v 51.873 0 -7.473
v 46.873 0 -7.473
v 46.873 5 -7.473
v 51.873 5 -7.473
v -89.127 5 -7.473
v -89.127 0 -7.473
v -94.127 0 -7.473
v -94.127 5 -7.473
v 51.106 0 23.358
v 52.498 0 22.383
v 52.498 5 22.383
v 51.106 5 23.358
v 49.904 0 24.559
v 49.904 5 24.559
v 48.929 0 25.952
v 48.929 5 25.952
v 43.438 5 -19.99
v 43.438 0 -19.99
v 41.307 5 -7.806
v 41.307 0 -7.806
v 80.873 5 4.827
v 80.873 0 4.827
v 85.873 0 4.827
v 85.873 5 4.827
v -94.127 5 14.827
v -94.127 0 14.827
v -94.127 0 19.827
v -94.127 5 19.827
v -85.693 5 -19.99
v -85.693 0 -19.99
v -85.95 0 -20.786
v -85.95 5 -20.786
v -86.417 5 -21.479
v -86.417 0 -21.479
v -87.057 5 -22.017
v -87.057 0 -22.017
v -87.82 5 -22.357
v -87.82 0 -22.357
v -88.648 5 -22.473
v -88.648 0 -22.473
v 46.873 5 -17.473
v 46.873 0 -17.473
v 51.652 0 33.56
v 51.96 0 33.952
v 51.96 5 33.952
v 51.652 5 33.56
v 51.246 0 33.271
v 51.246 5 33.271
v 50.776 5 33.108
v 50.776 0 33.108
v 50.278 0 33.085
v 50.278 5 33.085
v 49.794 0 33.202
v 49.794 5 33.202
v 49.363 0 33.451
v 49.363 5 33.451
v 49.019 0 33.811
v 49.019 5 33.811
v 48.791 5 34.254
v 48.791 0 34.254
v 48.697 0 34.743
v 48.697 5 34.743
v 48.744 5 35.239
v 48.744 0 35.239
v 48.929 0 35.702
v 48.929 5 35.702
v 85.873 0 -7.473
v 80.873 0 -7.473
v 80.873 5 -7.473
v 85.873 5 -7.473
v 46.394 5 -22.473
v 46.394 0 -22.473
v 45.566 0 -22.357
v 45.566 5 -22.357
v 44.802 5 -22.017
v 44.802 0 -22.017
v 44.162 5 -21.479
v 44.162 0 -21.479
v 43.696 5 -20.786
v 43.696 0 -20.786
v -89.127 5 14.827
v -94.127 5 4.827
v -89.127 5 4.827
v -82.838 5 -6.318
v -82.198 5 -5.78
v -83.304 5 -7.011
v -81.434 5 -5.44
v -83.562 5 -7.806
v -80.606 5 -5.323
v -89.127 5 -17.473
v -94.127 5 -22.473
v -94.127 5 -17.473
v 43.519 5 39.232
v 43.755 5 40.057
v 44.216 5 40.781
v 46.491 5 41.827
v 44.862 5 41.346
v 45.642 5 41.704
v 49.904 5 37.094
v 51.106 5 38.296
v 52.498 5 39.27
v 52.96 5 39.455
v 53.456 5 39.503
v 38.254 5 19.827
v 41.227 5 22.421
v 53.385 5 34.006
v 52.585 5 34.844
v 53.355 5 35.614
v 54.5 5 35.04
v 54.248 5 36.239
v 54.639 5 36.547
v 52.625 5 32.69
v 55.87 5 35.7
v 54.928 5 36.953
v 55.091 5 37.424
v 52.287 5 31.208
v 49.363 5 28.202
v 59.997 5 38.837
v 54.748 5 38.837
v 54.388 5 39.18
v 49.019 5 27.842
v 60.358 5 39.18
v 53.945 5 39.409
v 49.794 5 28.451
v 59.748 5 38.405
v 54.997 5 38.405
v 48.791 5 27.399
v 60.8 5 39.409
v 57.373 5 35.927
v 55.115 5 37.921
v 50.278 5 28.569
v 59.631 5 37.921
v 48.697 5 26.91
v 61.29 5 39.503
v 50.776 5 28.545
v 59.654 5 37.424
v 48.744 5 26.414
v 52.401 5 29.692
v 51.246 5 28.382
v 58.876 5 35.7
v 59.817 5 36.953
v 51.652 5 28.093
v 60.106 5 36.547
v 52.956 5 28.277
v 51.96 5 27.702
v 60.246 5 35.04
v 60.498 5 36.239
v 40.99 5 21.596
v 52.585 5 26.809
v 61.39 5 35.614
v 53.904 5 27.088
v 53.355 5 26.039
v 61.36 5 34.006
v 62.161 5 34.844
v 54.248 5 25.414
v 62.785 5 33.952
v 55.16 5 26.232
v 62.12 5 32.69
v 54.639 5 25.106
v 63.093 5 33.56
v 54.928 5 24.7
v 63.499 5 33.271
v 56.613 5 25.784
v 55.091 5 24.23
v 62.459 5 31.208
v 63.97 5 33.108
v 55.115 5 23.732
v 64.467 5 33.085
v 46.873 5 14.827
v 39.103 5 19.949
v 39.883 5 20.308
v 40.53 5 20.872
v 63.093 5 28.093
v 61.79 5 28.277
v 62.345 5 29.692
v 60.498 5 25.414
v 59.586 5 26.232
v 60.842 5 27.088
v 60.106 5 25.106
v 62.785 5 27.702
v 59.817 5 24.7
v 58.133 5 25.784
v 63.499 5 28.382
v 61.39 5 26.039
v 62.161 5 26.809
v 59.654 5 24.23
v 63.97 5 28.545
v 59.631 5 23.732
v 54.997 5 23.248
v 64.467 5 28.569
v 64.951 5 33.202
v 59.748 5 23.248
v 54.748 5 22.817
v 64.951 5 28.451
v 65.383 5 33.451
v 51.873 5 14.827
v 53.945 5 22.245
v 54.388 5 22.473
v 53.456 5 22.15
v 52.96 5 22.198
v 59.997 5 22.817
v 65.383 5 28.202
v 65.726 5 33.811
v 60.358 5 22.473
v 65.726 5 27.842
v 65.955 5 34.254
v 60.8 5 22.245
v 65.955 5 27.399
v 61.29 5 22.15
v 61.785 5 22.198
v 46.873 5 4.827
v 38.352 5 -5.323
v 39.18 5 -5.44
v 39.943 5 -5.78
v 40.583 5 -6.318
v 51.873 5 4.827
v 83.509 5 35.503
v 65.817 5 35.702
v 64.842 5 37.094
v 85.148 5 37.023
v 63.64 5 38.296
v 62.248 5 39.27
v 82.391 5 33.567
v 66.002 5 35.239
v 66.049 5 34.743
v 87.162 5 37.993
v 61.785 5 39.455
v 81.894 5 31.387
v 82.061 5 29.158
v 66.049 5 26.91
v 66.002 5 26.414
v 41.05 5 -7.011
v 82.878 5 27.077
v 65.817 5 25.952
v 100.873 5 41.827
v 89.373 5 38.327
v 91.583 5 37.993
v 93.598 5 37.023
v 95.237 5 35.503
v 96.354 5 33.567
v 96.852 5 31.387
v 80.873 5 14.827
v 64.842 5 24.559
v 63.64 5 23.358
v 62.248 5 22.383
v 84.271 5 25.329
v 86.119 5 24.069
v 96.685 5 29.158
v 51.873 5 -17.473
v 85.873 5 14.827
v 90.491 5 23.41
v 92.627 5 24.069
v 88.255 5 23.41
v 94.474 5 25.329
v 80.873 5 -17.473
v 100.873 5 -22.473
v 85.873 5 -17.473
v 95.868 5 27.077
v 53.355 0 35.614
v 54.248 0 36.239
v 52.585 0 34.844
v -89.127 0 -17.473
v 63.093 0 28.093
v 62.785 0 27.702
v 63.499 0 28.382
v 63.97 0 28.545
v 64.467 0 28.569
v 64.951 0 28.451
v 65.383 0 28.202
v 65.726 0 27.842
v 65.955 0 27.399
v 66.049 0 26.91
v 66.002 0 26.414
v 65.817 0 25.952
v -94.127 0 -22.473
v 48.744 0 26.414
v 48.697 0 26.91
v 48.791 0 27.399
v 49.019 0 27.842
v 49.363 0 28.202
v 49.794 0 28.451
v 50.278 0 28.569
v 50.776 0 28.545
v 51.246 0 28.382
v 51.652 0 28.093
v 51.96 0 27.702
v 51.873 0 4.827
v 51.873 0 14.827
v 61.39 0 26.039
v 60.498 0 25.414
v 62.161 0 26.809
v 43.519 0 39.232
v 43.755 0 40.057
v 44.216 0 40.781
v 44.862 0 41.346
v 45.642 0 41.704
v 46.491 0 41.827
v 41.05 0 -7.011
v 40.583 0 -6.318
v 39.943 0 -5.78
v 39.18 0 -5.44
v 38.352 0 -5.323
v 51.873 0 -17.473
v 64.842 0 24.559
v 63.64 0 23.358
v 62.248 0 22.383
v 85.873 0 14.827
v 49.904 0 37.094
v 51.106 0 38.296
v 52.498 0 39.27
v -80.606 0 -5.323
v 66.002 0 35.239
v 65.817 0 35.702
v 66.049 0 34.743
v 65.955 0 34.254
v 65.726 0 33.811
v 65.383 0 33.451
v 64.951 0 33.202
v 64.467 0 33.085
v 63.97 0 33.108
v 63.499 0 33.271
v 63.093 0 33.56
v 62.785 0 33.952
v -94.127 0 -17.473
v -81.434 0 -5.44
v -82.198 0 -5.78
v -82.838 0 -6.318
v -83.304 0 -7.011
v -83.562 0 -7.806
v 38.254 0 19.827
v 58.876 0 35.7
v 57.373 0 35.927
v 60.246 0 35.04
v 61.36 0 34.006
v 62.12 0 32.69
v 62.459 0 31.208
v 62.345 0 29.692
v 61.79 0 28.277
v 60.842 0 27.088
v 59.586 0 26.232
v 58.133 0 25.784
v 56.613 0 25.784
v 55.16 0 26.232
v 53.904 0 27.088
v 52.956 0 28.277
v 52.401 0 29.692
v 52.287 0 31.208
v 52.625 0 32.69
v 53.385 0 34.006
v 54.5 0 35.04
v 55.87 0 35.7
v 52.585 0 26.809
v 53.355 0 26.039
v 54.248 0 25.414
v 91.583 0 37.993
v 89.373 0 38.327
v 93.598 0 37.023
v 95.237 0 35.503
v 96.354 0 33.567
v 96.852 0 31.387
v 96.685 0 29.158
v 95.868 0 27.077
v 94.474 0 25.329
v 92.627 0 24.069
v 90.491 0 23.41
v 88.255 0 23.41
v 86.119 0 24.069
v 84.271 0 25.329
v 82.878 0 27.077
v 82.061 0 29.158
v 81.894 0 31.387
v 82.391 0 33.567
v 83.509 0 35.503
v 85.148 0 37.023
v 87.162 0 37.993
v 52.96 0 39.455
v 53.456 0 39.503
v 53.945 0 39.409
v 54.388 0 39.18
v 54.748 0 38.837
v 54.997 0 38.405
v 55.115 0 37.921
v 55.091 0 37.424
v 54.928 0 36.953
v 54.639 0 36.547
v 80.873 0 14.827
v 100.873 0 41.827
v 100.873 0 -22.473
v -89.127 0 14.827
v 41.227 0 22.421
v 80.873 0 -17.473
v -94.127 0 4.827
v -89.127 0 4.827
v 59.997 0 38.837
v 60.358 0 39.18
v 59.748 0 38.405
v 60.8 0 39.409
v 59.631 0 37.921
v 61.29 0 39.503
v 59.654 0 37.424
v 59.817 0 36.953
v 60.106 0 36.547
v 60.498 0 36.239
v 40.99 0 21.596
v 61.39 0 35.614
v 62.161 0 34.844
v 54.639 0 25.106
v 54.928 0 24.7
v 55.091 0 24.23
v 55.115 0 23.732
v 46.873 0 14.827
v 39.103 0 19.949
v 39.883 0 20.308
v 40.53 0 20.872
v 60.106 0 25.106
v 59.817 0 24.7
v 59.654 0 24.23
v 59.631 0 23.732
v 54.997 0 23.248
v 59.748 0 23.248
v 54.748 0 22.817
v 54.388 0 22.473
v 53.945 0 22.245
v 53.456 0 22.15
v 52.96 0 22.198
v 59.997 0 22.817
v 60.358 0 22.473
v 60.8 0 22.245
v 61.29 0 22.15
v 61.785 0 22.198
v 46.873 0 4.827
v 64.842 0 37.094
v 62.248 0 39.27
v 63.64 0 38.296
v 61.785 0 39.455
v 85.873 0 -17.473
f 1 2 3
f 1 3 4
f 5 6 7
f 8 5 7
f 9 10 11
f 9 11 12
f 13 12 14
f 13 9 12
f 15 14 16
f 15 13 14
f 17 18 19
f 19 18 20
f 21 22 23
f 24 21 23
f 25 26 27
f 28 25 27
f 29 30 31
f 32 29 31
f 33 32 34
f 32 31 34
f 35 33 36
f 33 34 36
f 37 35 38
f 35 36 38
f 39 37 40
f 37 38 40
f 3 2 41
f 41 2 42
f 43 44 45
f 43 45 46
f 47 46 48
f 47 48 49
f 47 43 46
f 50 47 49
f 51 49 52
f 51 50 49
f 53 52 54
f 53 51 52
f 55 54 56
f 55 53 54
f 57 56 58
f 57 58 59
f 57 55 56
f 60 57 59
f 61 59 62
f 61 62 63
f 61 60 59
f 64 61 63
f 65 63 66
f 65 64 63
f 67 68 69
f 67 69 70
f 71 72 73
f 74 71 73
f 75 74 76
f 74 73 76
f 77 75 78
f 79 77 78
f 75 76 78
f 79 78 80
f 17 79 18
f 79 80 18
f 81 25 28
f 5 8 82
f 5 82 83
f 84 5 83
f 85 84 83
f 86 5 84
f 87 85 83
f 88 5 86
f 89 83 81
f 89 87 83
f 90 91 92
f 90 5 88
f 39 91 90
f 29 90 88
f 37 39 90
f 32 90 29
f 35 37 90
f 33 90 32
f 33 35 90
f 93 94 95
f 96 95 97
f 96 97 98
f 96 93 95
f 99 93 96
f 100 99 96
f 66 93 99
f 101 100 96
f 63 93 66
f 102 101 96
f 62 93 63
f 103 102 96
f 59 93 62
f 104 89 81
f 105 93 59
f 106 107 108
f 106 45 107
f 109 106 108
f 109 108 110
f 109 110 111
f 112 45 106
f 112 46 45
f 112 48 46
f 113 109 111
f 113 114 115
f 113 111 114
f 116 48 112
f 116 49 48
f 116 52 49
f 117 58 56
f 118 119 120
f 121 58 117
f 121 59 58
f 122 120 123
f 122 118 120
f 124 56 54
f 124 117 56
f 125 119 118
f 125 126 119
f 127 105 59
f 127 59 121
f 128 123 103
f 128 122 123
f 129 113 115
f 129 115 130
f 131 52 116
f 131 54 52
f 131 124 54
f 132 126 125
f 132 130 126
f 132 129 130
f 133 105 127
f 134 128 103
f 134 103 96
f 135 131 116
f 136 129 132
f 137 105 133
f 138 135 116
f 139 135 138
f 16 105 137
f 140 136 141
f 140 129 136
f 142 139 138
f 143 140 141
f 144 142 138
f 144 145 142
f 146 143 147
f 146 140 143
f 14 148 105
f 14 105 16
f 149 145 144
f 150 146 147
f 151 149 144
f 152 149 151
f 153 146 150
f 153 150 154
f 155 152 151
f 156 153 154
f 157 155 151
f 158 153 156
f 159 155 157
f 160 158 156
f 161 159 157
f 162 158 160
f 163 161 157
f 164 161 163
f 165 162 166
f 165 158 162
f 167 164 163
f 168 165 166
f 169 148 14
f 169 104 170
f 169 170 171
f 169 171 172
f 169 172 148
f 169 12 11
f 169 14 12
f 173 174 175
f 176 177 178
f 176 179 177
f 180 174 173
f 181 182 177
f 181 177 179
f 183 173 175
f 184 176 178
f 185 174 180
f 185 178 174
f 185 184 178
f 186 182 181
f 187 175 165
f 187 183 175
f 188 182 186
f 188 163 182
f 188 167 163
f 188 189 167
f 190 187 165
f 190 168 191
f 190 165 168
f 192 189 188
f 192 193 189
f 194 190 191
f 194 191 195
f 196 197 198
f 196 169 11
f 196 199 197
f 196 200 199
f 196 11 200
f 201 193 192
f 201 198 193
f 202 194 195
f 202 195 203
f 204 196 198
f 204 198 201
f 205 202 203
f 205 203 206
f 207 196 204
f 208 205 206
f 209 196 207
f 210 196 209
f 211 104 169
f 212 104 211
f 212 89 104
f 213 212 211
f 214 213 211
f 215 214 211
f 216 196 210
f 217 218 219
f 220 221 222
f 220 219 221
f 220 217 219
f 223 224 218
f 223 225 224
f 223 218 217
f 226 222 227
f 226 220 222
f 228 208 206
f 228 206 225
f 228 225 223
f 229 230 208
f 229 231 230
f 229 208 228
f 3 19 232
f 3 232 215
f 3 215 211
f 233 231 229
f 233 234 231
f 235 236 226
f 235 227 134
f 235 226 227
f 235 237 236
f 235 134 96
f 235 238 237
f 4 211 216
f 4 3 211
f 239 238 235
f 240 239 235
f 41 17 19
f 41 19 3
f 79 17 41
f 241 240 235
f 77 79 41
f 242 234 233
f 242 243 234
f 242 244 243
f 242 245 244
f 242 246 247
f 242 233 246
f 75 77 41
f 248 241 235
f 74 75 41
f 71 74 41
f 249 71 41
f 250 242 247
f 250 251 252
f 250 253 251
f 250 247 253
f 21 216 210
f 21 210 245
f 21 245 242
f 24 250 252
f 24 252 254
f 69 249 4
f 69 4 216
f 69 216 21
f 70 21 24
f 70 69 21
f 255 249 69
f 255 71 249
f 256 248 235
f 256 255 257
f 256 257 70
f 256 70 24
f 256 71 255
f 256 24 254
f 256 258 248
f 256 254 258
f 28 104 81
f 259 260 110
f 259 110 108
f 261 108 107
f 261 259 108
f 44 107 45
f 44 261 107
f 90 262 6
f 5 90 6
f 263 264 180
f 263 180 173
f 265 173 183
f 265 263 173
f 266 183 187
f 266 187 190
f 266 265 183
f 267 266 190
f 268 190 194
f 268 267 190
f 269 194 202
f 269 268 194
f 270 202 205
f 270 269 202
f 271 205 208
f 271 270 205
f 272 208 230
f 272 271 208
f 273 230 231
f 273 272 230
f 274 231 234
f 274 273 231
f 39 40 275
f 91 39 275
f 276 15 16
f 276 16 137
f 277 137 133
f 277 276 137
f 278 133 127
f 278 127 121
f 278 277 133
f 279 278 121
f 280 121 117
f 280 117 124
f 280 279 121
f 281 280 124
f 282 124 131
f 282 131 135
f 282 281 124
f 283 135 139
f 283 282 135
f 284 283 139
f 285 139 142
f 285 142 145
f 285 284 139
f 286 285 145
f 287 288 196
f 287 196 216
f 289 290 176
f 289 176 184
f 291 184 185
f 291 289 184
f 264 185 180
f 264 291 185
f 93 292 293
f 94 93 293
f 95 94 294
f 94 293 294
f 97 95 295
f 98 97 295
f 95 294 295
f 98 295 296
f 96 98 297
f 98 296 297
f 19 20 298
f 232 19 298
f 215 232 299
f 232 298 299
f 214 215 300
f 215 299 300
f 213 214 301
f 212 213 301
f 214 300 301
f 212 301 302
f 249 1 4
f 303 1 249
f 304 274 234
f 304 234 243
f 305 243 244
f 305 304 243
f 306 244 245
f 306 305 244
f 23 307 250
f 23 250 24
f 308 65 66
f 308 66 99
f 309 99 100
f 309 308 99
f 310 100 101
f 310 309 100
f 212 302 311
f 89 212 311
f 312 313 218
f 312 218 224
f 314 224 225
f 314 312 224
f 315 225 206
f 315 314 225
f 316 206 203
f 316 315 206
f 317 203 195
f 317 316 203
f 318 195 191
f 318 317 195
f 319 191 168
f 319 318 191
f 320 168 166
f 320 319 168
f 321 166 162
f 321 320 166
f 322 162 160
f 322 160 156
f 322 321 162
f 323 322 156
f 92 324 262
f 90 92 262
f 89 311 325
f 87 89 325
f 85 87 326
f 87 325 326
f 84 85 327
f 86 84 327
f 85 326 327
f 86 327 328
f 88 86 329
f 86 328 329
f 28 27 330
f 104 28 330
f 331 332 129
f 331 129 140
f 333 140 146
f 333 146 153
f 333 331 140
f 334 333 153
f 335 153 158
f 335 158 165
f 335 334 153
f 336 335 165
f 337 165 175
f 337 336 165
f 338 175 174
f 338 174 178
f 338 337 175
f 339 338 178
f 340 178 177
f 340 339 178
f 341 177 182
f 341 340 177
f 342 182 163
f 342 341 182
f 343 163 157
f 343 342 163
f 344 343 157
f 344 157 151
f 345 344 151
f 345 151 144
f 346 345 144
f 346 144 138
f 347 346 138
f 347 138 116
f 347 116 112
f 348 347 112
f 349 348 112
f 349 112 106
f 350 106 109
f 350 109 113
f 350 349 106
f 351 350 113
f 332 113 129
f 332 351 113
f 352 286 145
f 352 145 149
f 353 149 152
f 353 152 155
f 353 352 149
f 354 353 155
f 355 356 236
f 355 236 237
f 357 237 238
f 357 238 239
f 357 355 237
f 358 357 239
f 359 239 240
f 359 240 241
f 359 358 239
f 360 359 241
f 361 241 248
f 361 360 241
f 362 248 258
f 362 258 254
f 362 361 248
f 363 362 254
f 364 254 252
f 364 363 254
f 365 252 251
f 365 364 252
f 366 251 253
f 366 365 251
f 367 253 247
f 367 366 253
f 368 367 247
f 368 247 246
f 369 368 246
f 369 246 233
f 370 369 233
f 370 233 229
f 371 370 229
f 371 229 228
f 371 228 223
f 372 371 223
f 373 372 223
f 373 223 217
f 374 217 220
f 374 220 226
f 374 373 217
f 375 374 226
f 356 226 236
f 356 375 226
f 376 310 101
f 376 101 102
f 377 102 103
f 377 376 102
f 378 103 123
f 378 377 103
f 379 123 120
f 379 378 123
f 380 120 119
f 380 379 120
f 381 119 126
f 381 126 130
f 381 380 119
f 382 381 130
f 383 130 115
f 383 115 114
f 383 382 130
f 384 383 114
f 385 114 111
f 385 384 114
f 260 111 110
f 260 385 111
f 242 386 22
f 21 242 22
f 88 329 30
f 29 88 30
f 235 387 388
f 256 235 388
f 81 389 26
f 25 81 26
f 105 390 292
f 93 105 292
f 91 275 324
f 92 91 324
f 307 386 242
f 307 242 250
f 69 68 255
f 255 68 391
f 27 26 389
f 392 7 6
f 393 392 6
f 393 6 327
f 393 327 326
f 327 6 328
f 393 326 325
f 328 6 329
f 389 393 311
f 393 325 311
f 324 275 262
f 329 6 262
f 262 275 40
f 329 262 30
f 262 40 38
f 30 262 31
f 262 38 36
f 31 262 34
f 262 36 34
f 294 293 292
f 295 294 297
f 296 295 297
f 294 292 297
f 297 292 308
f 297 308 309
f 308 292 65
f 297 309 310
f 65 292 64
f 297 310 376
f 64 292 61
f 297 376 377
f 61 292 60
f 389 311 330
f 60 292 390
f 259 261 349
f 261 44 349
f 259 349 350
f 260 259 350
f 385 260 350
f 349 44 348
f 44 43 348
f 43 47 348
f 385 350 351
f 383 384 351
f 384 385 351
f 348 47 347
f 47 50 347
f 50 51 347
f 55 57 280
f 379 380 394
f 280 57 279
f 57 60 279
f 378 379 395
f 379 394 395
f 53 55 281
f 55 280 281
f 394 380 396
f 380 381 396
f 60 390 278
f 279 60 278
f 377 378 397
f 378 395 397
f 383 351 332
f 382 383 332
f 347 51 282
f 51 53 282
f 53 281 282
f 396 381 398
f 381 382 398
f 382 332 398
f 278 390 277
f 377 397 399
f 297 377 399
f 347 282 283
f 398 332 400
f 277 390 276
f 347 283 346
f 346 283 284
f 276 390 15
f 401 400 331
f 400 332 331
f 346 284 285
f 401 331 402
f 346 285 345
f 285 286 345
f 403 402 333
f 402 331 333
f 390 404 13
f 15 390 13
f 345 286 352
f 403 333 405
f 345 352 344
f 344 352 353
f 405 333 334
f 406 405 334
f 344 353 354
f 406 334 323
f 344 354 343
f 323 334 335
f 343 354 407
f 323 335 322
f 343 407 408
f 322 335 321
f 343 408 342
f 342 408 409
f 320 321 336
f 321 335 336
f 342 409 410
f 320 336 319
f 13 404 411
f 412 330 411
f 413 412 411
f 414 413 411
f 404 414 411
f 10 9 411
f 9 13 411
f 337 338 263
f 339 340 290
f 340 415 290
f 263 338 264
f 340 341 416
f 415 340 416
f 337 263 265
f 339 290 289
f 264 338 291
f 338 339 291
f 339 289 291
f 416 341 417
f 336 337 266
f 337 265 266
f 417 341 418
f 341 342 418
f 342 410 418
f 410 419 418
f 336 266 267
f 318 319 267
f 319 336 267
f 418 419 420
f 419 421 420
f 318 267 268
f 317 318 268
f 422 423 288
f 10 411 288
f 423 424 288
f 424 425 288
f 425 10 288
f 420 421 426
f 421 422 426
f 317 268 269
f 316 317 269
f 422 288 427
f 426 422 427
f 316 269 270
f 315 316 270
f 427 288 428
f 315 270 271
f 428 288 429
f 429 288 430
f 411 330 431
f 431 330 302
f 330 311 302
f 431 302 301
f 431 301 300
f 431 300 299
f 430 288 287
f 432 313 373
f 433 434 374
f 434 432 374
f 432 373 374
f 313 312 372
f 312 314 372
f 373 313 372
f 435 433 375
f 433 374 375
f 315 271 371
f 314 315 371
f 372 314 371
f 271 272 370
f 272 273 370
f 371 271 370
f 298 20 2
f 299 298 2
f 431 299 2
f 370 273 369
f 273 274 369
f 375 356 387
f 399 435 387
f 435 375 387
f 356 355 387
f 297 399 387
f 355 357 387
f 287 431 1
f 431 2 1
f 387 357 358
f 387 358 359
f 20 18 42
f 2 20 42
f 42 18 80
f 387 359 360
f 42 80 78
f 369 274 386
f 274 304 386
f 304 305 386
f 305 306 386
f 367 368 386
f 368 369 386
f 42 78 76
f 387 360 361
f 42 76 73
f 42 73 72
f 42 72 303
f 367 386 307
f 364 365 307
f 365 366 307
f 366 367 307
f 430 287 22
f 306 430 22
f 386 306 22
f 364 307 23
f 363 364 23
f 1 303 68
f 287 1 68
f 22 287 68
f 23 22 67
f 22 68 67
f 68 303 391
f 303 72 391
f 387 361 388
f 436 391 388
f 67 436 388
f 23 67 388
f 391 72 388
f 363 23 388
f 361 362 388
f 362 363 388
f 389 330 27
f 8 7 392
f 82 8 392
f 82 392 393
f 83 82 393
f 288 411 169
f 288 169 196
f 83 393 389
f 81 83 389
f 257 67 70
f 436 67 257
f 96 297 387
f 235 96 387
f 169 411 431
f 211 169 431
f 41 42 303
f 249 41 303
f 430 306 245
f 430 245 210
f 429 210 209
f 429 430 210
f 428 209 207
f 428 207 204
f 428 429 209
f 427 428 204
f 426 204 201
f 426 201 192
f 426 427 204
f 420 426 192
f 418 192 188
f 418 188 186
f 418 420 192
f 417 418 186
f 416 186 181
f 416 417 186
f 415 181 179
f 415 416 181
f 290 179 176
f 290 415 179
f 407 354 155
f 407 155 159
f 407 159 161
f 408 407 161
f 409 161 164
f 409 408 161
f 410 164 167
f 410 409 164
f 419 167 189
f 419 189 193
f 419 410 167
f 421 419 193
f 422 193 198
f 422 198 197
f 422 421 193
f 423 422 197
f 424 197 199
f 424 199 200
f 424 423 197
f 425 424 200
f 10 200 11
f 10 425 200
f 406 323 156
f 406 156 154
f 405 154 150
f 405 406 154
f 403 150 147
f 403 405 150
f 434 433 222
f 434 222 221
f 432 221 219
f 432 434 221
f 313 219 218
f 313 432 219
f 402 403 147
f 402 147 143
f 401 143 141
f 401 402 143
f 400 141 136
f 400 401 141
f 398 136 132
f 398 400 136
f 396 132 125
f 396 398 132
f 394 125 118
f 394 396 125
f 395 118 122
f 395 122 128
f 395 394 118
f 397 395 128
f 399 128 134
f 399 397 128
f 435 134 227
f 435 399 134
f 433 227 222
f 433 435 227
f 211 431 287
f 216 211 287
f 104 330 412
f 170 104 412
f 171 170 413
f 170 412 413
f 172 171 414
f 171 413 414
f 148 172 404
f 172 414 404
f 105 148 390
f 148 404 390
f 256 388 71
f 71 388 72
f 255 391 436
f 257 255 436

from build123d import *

# Parameters (mm, degrees)
SKETCH_1_R      = 5.1
SKETCH_1_R_2    = 7.5
SKETCH_1_W      = 5
SKETCH_1_H      = 10
EXTRUDE_1_DEPTH = 5


with BuildPart() as part:
    # 草图1 → 凸台-拉伸1 (new body)
    with BuildSketch(Plane(origin=(0, 0, 0), x_dir=(1, 0, 0), z_dir=(0, 1, 0))):
        with BuildLine():
            Line((41.226602941, -22.421259901), (43.51896829, -39.231939129))
            ThreePointArc((43.51896829, -39.231939129), (44.518645935, -41.086690093), (46.491458794, -41.826599515))
            Line((46.491458794, -41.826599515), (46.872785616, -41.826599515))
            Line((46.872785616, -41.826599515), (100.872785616, -41.826599515))
            Line((100.872785616, -41.826599515), (100.872785616, -21.15))
            Line((100.872785616, -21.15), (100.872785616, 22.473400485))
            Line((100.872785616, 22.473400485), (46.393557665, 22.473400485))
            ThreePointArc((46.393557665, 22.473400485), (44.463634871, 21.770223946), (43.438429698, 19.990332491))
            Line((43.438429698, 19.990332491), (41.307141533, 7.806468479))
            ThreePointArc((41.307141533, 7.806468479), (40.28193636, 6.026577025), (38.352013566, 5.323400485))
            Line((38.352013566, 5.323400485), (-80.606442335, 5.323400485))
            ThreePointArc((-80.606442335, 5.323400485), (-82.536365129, 6.026577025), (-83.561570302, 7.806468479))
            Line((-83.561570302, 7.806468479), (-85.692858467, 19.990332491))
            ThreePointArc((-85.692858467, 19.990332491), (-86.71806364, 21.770223946), (-88.647986434, 22.473400485))
            Line((-88.647986434, 22.473400485), (-94.127214384, 22.473400485))
            Line((-94.127214384, 22.473400485), (-94.127214384, 17.473400485))
            Line((-94.127214384, 17.473400485), (-89.127214384, 17.473400485))
            Line((-89.127214384, 17.473400485), (-89.127214384, 7.473400485))
            Line((-89.127214384, 7.473400485), (-94.127214384, 7.473400485))
            Line((-94.127214384, 7.473400485), (-94.127214384, -4.826599515))
            Line((-94.127214384, -4.826599515), (-89.127214384, -4.826599515))
            Line((-89.127214384, -4.826599515), (-89.127214384, -14.826599515))
            Line((-89.127214384, -14.826599515), (-94.127214384, -14.826599515))
            Line((-94.127214384, -14.826599515), (-94.127214384, -19.826599515))
            Line((-94.127214384, -19.826599515), (38.254112437, -19.826599515))
            ThreePointArc((38.254112437, -19.826599515), (40.226925296, -20.566508937), (41.226602941, -22.421259901))
        make_face()
        with Locations(Location((57.372785616, -30.826599515, 0), (0, 0, 270))):
            Circle(SKETCH_1_R, mode=Mode.SUBTRACT)
        with Locations(Location((89.372785616, -30.826599515, 0), (0, 0, 270))):
            Circle(SKETCH_1_R_2, mode=Mode.SUBTRACT)
        with Locations((49.372785616, 12.473400485)):
            Rectangle(SKETCH_1_W, SKETCH_1_H, mode=Mode.SUBTRACT)
        with Locations((49.372785616, -9.826599515)):
            Rectangle(SKETCH_1_W, SKETCH_1_H, mode=Mode.SUBTRACT)
        with Locations((83.372785616, -9.826599515)):
            Rectangle(SKETCH_1_W, SKETCH_1_H, mode=Mode.SUBTRACT)
        with Locations((83.372785616, 12.473400485)):
            Rectangle(SKETCH_1_W, SKETCH_1_H, mode=Mode.SUBTRACT)
        with BuildLine():
            ThreePointArc((52.497785616, -22.382851828), (50.478494499, -23.932308398), (48.929037929, -25.951599515))
            ThreePointArc((48.929037929, -25.951599515), (49.569582385, -28.342143972), (51.960126842, -27.701599515))
            ThreePointArc((51.960126842, -27.701599515), (52.953368233, -26.407182132), (54.247785616, -25.413940741))
            ThreePointArc((54.247785616, -25.413940741), (54.888330072, -23.023396285), (52.497785616, -22.382851828))
        make_face(mode=Mode.SUBTRACT)
        with BuildLine():
            ThreePointArc((65.816533303, -25.951599503), (64.267076731, -23.932308389), (62.247785614, -22.38285182))
            ThreePointArc((62.247785614, -22.38285182), (59.857241158, -23.023396278), (60.497785616, -25.413940734))
            ThreePointArc((60.497785616, -25.413940734), (61.792202999, -26.407182125), (62.785444391, -27.701599506))
            ThreePointArc((62.785444391, -27.701599506), (65.175988849, -28.34214396), (65.816533303, -25.951599503))
        make_face(mode=Mode.SUBTRACT)
        with BuildLine():
            ThreePointArc((62.247785626, -39.270347195), (64.267076742, -37.720890621), (65.81653331, -35.701599501))
            ThreePointArc((65.81653331, -35.701599501), (65.175988849, -33.311055045), (62.785444394, -33.951599506))
            ThreePointArc((62.785444394, -33.951599506), (61.792203004, -35.24601689), (60.497785622, -36.239258284))
            ThreePointArc((60.497785622, -36.239258284), (59.857241169, -38.629802741), (62.247785626, -39.270347195))
        make_face(mode=Mode.SUBTRACT)
        with BuildLine():
            ThreePointArc((48.929037937, -35.701599515), (50.478494509, -37.720890632), (52.497785627, -39.270347201))
            ThreePointArc((52.497785627, -39.270347201), (54.888330083, -38.629802742), (54.247785624, -36.239258286))
            ThreePointArc((54.247785624, -36.239258286), (52.953368241, -35.246016896), (51.960126849, -33.951599514))
            ThreePointArc((51.960126849, -33.951599514), (49.569582392, -33.311055058), (48.929037937, -35.701599515))
        make_face(mode=Mode.SUBTRACT)
    extrude(amount=EXTRUDE_1_DEPTH)


solid = part.part
